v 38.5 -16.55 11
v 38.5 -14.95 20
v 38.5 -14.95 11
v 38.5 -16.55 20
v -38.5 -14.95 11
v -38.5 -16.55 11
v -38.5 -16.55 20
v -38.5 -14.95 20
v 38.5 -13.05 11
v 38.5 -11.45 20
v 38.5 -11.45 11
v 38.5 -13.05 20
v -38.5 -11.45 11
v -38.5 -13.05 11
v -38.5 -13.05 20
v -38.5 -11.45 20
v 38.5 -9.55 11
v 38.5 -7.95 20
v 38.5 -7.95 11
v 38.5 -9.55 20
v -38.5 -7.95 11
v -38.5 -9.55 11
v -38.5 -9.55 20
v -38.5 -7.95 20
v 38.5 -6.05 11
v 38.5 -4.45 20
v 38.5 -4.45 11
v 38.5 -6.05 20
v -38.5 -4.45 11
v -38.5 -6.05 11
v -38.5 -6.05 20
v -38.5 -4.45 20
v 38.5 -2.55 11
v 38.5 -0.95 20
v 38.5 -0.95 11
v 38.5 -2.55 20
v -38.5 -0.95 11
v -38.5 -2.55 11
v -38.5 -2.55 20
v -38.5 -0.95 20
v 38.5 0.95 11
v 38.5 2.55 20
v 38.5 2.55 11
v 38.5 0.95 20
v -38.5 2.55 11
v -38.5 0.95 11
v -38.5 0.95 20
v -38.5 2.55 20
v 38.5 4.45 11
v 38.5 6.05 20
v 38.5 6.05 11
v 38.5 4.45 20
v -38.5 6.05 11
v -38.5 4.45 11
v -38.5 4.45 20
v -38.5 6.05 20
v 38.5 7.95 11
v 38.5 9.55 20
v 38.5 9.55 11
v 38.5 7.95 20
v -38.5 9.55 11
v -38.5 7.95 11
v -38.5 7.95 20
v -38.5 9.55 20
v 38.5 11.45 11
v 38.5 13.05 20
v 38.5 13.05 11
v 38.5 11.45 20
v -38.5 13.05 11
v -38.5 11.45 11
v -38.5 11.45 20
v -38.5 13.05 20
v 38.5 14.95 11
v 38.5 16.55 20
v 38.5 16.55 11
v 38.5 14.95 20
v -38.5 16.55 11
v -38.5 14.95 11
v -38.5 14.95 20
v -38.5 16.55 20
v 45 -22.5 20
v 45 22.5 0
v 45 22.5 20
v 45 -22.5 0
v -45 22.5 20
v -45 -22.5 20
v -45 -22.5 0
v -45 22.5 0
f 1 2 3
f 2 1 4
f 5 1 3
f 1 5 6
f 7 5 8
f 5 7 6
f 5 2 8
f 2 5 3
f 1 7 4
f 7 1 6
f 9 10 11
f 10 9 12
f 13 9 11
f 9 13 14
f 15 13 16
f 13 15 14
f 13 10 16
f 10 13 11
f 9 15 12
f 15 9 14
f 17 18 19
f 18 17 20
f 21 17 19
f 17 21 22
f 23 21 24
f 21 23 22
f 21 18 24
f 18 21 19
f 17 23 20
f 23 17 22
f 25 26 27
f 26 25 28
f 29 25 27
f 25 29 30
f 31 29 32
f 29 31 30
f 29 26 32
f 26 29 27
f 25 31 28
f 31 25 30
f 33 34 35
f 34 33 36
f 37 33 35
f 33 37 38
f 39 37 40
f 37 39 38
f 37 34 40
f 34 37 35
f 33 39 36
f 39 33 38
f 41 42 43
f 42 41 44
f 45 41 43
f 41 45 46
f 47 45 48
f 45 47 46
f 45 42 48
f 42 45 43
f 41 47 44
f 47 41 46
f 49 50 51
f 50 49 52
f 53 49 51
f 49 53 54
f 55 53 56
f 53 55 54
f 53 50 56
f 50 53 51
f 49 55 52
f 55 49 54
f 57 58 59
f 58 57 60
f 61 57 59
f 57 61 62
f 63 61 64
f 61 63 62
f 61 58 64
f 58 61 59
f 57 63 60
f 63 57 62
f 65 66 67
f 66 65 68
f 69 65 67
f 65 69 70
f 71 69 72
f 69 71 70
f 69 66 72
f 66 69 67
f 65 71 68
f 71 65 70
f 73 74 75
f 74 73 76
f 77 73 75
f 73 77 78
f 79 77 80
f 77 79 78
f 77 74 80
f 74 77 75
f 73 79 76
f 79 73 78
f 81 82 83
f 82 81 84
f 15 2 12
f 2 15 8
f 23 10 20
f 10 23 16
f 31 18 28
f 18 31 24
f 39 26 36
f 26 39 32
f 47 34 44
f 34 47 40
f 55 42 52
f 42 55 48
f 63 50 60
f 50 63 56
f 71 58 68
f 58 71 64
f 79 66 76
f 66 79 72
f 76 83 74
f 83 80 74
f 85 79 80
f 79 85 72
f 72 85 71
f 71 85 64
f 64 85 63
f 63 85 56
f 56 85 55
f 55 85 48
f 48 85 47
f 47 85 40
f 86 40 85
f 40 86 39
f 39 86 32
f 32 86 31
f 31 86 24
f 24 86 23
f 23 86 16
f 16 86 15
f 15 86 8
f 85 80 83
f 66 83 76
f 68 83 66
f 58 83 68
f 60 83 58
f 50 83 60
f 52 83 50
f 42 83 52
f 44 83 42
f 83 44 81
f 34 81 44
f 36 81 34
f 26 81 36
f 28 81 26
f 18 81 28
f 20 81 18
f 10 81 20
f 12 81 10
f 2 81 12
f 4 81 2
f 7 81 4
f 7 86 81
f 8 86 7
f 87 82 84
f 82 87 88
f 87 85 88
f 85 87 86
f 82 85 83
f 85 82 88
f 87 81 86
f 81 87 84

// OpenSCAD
// Drying rack for 10 microscope slides (75 x 25 x 1 mm)
// Slides stand upright on their long edge, held in slots cut into the top face.

// --- Base block dimensions ---
base_L = 90;   // length along X (mm)
base_W = 45;   // width along Y (mm)
base_H = 20;   // height along Z (mm)

// --- Slot dimensions ---
slot_L = 77;   // slot length along X (mm)
slot_W = 1.6;  // slot width along Y (mm)
slot_D = 10;   // slot depth into the block (mm)

// --- Slot layout ---
n_slots = 10;          // number of slots
slot_pitch = 3.5;      // centre-to-centre spacing along Y (mm)

// --- Derived values ---
// Total span of slot centres (first to last)
span = (n_slots - 1) * slot_pitch;   // 9 * 3.5 = 31.5 mm
// Y position of the first slot centre (so the group is centred on Y=0)
y_first = -span / 2;

// --- Build ---
$fn = 64;

// Solid base block, centred on origin in X and Y, resting on z=0
module base() { translate([-base_L/2, -base_W/2, 0])
    cube([base_L, base_W, base_H]); }

// Cutting tool: one slot, extended 1 mm past the top face (z = base_H + 1)
// so the cut is open at the top and no faces are exactly coplanar.
// The slot is exactly slot_L long in X and slot_W wide in Y (no X/Y extension),
// so the resulting slots are 77 x 1.6 mm and centred on the block in X and Y.
module slot_tool() { translate([-slot_L/2, -slot_W/2, base_H + 1 - slot_D])
    cube([slot_L, slot_W, slot_D + 1]); }

// Difference: base minus all 10 slots
difference() {
    base();
    for (i = [0 : n_slots - 1]) {
        y_i = y_first + i * slot_pitch;
        translate([0, y_i, 0])
            slot_tool();
    }
}
